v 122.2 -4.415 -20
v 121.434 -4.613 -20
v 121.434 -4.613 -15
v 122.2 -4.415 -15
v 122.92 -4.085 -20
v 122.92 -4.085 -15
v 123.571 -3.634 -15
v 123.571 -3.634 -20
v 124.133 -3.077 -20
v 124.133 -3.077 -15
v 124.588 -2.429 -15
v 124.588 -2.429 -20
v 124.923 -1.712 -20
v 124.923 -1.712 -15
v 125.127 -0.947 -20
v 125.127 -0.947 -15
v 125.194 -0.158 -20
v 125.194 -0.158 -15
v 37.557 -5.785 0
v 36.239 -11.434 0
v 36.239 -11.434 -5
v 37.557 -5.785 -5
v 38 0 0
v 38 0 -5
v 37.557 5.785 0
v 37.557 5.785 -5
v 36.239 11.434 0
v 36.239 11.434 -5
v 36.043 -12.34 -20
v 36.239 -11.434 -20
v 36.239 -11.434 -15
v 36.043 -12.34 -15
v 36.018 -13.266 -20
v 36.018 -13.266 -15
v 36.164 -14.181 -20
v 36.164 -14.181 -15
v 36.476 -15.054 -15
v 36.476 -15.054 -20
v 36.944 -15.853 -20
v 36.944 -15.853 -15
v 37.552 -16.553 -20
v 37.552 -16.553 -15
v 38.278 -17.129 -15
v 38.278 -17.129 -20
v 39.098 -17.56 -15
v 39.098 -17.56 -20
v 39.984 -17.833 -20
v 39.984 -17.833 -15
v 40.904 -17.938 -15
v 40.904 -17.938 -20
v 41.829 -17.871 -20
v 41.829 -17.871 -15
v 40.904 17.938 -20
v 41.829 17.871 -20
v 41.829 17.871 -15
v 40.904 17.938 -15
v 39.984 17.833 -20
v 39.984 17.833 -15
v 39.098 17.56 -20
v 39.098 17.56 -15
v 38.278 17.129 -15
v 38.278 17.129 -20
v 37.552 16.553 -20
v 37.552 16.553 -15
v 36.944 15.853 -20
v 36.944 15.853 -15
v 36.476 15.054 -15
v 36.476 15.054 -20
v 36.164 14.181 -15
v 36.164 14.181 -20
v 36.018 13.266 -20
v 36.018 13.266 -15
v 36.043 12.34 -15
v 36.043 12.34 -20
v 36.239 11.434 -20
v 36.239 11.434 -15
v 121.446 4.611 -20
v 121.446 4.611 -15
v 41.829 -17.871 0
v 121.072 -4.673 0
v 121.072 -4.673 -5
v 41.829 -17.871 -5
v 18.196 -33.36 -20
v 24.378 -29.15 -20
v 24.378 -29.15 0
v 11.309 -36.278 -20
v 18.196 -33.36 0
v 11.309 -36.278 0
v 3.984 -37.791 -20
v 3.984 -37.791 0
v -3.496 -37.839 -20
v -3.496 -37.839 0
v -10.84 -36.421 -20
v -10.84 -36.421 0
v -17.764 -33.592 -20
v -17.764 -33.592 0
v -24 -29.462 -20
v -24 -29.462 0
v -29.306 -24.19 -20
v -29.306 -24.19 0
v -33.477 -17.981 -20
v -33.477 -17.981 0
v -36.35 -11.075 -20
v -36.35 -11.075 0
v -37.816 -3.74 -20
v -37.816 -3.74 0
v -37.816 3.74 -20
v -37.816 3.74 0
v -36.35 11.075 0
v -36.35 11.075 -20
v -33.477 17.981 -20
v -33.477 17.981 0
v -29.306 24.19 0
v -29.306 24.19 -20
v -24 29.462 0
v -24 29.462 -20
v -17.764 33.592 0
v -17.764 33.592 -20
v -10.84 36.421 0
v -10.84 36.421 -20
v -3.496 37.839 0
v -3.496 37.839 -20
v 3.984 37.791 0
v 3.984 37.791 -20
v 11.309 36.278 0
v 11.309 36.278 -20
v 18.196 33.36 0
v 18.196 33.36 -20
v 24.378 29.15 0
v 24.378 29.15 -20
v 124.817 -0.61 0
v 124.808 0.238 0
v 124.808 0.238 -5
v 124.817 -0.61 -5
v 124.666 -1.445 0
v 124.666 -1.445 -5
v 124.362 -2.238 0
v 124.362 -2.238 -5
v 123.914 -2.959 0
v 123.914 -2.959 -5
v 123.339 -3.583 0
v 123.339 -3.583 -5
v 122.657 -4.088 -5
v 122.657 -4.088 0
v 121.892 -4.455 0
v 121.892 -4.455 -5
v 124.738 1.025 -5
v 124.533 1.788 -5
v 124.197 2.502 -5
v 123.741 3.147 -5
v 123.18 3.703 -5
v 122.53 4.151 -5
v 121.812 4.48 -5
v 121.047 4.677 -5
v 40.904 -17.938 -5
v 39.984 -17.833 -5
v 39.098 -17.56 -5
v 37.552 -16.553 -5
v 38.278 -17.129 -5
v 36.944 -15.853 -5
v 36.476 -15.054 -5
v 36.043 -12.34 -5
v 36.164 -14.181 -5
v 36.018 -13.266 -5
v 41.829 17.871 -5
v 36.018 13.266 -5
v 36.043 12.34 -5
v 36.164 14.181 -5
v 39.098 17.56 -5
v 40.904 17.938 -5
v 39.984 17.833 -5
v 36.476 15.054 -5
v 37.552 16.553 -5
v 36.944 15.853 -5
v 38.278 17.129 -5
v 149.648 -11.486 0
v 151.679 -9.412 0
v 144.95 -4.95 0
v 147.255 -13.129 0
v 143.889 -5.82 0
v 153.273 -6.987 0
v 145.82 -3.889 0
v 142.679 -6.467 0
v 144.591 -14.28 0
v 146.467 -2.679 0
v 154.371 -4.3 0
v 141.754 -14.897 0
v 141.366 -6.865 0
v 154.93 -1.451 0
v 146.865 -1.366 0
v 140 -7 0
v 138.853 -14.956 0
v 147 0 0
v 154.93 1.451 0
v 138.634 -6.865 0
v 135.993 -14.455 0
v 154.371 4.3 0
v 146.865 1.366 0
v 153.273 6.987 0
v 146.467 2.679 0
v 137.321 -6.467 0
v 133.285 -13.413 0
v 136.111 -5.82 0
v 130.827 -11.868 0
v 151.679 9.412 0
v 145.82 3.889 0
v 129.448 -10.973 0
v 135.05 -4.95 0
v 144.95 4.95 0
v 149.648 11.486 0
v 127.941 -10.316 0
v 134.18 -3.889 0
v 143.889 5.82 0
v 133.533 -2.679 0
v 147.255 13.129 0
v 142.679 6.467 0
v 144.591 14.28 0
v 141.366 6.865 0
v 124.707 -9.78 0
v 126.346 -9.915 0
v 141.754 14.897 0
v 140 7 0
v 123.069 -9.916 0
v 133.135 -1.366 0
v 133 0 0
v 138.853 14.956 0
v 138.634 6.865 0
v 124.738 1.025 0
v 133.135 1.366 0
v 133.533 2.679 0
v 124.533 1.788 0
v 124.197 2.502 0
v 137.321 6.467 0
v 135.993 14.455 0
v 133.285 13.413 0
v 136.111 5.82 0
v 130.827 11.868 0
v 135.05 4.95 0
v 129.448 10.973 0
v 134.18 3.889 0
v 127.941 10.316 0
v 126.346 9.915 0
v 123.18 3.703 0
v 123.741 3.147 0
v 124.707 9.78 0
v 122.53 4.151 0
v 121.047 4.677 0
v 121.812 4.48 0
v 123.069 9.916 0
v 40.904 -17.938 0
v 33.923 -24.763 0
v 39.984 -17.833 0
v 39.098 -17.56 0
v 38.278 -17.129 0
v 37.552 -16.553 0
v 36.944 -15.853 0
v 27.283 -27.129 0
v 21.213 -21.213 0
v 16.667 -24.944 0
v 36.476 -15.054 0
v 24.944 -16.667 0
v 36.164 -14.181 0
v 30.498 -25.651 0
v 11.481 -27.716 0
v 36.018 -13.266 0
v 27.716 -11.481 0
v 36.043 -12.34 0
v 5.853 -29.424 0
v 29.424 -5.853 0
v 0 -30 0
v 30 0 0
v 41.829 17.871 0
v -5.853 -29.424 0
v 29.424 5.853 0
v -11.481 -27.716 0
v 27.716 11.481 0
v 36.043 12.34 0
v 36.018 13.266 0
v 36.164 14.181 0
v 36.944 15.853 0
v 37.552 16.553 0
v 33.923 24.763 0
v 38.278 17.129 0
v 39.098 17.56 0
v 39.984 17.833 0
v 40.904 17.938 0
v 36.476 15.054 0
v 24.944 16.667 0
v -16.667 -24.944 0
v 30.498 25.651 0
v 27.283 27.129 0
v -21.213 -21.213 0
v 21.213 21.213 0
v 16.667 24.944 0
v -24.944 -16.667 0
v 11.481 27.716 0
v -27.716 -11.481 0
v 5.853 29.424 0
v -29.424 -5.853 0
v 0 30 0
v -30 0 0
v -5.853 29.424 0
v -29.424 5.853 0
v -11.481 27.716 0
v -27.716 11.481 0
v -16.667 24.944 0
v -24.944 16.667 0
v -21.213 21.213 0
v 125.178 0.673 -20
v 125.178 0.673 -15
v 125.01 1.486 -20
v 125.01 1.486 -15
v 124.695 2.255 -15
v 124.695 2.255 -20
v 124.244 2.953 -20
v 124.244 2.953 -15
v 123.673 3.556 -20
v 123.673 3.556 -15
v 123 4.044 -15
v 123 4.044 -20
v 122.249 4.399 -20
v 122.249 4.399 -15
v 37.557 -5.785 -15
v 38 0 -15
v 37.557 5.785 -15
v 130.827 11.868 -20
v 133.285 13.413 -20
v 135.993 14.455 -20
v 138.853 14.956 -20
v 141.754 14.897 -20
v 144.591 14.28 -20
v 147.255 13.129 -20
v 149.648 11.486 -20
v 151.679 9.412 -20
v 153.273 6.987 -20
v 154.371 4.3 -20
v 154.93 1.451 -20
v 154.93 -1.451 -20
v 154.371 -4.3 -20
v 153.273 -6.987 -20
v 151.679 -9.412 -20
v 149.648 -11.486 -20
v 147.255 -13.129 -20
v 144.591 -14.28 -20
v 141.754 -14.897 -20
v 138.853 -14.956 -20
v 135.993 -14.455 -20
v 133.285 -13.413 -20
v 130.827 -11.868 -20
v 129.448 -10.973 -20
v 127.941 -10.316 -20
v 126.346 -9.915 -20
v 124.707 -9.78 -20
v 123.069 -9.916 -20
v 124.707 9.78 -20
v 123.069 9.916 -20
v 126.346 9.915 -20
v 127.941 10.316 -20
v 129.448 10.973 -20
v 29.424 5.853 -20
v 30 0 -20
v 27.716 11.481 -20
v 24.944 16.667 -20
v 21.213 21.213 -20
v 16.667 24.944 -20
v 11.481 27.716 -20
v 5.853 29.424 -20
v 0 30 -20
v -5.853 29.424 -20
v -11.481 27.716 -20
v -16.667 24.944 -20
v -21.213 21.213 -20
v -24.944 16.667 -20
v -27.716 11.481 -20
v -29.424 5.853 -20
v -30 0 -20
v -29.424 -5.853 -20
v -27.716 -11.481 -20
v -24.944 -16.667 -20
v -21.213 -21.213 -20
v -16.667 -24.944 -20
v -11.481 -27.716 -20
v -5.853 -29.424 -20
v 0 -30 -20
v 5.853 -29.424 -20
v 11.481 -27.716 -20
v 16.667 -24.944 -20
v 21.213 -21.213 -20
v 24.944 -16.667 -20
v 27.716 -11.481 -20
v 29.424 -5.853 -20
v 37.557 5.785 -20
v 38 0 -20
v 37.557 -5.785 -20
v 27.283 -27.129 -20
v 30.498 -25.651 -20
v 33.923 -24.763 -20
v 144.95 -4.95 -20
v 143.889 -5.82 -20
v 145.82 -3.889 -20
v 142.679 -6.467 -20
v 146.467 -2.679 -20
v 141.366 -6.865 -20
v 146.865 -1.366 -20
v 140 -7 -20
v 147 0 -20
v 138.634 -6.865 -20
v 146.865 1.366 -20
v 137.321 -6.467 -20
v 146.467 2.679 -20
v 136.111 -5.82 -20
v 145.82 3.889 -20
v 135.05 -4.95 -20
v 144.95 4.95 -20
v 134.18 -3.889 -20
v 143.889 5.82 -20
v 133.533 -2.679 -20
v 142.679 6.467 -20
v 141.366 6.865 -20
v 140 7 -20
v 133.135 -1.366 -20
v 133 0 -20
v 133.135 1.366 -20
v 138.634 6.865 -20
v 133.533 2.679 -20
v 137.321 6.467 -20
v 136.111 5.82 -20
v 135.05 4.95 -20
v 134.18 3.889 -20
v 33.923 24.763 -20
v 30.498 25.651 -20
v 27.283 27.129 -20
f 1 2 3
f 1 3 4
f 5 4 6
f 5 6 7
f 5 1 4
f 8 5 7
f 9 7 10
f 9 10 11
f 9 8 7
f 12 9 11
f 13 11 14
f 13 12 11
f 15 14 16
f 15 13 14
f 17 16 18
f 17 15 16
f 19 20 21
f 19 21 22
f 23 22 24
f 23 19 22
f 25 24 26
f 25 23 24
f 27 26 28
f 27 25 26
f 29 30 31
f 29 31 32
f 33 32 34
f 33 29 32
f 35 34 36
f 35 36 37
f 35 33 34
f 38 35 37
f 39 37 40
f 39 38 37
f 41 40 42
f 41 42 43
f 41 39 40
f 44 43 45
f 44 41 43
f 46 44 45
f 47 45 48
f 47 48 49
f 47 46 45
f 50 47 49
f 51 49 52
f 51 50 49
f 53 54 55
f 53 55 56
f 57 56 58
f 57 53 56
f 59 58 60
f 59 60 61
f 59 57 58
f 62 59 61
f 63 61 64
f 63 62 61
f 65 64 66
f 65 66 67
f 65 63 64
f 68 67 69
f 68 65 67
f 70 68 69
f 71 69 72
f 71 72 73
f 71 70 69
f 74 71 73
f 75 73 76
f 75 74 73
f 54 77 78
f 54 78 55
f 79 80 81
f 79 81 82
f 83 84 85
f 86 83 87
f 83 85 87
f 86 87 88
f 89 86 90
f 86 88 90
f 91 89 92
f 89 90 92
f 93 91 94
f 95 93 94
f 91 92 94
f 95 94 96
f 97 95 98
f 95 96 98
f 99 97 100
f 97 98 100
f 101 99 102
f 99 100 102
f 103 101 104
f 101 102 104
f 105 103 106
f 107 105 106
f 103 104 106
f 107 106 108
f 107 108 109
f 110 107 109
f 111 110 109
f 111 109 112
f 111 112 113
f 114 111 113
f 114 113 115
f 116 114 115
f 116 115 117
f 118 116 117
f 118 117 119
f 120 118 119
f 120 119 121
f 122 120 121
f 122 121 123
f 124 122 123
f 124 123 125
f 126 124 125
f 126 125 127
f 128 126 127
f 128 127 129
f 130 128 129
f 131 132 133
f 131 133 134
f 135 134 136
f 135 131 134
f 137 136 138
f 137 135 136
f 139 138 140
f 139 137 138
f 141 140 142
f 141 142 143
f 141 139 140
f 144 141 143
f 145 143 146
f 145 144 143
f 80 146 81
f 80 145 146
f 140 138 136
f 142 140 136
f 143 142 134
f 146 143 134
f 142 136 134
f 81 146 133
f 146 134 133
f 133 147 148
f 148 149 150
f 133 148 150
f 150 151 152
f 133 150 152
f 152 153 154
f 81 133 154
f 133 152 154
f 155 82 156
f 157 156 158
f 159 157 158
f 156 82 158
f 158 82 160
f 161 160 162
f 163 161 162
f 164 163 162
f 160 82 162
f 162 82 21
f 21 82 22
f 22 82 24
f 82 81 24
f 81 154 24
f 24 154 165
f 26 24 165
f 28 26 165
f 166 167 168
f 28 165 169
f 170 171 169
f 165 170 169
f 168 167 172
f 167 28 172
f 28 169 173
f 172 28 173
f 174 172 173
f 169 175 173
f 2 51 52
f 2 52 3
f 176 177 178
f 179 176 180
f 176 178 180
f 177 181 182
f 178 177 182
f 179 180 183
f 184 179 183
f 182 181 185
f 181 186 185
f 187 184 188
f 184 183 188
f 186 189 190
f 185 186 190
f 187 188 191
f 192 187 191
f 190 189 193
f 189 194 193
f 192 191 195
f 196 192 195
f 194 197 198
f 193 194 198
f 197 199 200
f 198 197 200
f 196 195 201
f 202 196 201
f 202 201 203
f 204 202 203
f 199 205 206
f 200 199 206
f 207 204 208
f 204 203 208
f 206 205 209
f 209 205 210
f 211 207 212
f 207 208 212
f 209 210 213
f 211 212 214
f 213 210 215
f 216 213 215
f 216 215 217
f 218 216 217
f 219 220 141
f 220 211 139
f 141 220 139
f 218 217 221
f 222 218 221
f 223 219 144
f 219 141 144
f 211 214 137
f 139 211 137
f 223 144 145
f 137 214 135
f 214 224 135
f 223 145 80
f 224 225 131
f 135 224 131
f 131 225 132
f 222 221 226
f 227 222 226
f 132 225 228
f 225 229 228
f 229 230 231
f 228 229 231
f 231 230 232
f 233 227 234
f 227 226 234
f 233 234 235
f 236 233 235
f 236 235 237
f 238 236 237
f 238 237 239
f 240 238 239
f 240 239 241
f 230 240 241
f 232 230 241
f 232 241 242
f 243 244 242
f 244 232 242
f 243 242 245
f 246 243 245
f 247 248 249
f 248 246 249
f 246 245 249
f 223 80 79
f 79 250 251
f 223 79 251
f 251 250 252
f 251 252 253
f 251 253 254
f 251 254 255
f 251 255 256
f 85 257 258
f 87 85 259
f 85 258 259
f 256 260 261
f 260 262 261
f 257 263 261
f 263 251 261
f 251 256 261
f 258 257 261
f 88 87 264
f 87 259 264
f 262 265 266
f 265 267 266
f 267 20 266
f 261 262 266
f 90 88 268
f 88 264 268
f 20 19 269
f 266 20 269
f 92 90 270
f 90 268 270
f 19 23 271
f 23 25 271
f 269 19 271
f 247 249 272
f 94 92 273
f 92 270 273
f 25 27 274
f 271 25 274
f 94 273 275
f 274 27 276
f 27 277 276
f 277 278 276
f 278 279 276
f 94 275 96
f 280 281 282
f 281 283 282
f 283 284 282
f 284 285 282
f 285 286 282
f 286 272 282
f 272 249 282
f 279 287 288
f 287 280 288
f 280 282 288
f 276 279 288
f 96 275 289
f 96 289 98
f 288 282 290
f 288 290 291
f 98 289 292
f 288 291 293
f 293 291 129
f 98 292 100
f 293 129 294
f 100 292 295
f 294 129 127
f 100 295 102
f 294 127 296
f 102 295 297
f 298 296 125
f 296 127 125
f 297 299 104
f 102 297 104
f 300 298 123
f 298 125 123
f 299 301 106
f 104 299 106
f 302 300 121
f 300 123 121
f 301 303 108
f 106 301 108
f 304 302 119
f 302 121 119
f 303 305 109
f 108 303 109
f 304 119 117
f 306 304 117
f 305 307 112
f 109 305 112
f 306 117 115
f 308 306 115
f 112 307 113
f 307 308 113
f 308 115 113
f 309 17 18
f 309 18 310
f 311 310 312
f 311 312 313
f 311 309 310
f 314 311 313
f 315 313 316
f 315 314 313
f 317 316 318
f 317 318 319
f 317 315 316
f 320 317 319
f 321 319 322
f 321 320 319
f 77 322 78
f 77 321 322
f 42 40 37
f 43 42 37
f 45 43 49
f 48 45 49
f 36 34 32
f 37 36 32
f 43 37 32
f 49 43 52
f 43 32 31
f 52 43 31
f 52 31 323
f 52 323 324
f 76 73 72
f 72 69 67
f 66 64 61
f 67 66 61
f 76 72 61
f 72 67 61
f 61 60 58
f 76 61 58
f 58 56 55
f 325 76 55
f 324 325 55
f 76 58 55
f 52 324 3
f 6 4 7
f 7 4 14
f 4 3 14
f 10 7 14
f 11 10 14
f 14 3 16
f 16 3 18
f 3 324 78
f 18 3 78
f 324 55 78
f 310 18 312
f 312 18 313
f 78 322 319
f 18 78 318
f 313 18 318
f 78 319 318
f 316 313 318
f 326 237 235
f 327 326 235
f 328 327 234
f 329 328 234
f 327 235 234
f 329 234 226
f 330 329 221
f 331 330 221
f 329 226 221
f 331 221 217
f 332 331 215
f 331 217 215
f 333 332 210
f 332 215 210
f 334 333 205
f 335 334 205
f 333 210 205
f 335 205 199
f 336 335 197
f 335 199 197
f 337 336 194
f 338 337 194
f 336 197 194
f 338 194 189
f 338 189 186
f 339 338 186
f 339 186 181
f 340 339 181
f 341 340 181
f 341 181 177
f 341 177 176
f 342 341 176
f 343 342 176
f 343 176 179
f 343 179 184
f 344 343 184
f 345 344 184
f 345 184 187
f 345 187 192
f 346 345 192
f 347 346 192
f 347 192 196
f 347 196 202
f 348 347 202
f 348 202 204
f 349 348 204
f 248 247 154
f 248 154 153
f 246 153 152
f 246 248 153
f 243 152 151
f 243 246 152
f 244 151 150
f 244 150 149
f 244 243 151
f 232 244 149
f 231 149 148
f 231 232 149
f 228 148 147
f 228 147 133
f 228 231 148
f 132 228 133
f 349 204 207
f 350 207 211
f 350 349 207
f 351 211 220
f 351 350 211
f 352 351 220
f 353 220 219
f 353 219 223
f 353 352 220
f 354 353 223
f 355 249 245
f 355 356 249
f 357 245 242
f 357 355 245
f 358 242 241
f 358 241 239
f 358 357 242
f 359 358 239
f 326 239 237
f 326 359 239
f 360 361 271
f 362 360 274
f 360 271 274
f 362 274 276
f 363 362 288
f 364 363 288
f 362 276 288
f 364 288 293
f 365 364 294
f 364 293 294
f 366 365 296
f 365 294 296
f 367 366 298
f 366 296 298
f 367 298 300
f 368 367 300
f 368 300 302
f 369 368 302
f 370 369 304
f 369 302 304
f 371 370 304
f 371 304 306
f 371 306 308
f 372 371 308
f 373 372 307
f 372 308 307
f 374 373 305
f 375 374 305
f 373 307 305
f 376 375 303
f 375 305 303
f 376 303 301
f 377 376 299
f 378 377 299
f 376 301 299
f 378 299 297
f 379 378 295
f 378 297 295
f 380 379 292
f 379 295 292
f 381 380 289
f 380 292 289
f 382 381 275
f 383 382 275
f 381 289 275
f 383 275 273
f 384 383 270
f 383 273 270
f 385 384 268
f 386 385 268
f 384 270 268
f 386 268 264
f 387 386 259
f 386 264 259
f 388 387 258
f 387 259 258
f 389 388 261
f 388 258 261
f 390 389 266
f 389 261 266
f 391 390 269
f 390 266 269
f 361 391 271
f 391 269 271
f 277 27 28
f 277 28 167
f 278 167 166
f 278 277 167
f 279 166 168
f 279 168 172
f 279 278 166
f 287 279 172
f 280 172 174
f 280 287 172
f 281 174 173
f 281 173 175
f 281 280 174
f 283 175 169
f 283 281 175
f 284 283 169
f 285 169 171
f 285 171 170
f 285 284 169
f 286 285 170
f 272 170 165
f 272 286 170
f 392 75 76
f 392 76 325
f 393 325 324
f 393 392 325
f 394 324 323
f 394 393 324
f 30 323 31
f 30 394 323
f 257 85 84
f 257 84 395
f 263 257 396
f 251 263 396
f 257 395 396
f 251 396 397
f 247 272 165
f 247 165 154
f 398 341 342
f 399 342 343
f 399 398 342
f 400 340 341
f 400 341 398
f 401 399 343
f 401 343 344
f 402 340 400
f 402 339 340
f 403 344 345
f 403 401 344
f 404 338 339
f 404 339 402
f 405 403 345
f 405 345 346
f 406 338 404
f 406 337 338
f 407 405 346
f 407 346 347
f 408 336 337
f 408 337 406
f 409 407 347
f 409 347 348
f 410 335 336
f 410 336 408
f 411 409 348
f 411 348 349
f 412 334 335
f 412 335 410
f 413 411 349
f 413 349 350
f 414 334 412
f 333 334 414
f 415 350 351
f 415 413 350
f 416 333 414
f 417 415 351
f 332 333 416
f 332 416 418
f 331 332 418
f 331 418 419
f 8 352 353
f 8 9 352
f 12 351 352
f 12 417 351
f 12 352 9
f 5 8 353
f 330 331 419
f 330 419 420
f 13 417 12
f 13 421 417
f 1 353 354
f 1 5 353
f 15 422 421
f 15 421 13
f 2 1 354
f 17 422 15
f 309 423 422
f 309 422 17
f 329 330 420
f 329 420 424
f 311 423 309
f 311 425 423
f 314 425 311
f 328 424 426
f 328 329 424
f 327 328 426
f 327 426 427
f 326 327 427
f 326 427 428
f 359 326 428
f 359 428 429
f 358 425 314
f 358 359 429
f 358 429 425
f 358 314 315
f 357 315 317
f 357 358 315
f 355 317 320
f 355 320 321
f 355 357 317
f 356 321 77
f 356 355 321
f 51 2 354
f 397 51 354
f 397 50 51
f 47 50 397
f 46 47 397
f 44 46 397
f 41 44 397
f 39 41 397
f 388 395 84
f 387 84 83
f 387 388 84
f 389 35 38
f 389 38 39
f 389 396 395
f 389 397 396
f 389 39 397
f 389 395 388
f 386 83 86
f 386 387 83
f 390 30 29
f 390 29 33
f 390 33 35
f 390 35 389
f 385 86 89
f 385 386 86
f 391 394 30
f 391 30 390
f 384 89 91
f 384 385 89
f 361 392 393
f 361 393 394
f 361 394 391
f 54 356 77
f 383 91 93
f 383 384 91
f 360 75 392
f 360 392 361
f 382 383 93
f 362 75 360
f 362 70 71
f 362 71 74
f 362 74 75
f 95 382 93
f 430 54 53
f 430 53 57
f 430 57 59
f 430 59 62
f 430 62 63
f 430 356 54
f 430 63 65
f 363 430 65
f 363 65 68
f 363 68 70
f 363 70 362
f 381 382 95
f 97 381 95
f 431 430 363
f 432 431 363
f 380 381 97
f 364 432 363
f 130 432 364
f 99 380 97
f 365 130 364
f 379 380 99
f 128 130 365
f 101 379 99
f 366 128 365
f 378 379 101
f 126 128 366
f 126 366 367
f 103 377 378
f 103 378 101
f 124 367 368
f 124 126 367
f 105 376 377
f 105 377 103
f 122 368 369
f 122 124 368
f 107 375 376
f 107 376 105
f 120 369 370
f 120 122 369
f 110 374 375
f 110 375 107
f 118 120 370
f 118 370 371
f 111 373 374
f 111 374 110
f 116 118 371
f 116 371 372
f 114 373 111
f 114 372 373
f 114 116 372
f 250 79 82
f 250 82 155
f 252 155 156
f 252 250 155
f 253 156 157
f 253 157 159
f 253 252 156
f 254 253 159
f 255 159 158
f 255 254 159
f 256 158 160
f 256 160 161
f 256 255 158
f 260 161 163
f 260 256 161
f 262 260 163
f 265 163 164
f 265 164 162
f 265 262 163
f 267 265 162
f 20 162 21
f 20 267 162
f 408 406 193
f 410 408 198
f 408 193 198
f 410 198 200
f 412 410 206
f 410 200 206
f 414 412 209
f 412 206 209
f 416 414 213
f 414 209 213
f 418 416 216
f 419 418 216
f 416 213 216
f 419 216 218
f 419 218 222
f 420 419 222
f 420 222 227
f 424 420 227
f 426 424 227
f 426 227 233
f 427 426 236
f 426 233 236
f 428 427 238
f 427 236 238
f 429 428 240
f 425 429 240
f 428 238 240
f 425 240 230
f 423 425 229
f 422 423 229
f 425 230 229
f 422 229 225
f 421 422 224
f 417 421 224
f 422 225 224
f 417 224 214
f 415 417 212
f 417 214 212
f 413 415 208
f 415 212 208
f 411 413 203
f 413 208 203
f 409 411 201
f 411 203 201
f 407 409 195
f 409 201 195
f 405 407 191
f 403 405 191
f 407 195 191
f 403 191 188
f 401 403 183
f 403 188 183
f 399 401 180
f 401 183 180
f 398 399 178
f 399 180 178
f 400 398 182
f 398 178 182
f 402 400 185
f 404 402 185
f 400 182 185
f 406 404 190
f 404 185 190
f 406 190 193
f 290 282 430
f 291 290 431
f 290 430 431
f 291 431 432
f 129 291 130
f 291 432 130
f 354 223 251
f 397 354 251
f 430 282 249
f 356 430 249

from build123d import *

# Parameters (mm, degrees)
SKETCH1_R          = 30
SKETCH1_R_2        = 7
BASE_EXTRUDE_DEPTH = 20
FILLET1_R          = 10
FILLET2_R          = 20
CUT_EXTRUDE1_DEPTH = 5
CUT_EXTRUDE2_DEPTH = 5


with BuildPart() as part:
    # Sketch1 → Base-Extrude (new body)
    with BuildSketch(Plane.XY):
        with BuildLine():
            Line((27.935473676, 25.760615491), (128.063755469, 9.084385863))
            ThreePointArc((128.063755469, 9.084385863), (155, 0), (128.063755469, -9.084385863))
            Line((128.063755469, -9.084385863), (27.935473676, -25.760615491))
            ThreePointArc((27.935473676, -25.760615491), (-38, 0), (27.935473676, 25.760615491))
        make_face()
        Circle(SKETCH1_R, mode=Mode.SUBTRACT)
        with Locations((140, 0)):
            Circle(SKETCH1_R_2, mode=Mode.SUBTRACT)
    extrude(amount=-BASE_EXTRUDE_DEPTH)

    # Fillet1
    fillet1_edges = [part.edges().sort_by_distance(p)[0] for p in [
        (128.063755469, 9.084385863, -10),
        (128.063755469, -9.084385863, -10),
    ]]
    fillet(fillet1_edges, radius=FILLET1_R)

    # Fillet2
    fillet2_edges = [part.edges().sort_by_distance(p)[0] for p in [
        (27.935473676, 25.760615491, -10),
        (27.935473676, -25.760615491, -10),
    ]]
    fillet(fillet2_edges, radius=FILLET2_R)

    # Sketch2 → Cut-Extrude1 (cut)
    with BuildSketch(Plane.XY):
        with BuildLine():
            Line((41.828554558, 17.870982725), (121.046940728, 4.677267873))
            ThreePointArc((121.046940728, 4.677267873), (123.741079282, 3.147292859), (124.807655013, 0.238406077))
            ThreePointArc((124.807655013, 0.238406077), (123.914202634, -2.958553332), (121.071833732, -4.673121977))
            Line((121.071833732, -4.673121977), (41.828554558, -17.870982725))
            ThreePointArc((41.828554558, -17.870982725), (37.231968897, -16.217361812), (36.238855523, -11.43439331))
            ThreePointArc((36.238855523, -11.43439331), (38, 0), (36.238855523, 11.43439331))
            ThreePointArc((36.238855523, 11.43439331), (37.231968897, 16.217361812), (41.828554558, 17.870982725))
        make_face()
    extrude(amount=-CUT_EXTRUDE1_DEPTH, mode=Mode.SUBTRACT)

    # Sketch3 → Cut-Extrude2 (cut)
    with BuildSketch(Plane(origin=(0, 0, -20), x_dir=(-1, 0, 0), z_dir=(0, 0, -1))):
        with BuildLine():
            Line((-121.445609231, 4.610870174), (-41.828554558, 17.870982725))
            ThreePointArc((-41.828554558, 17.870982725), (-37.231968897, 16.217361812), (-36.238855523, 11.43439331))
            ThreePointArc((-36.238855523, 11.43439331), (-38, 0), (-36.238855523, -11.43439331))
            ThreePointArc((-36.238855523, -11.43439331), (-37.231968897, -16.217361812), (-41.828554558, -17.870982725))
            Line((-41.828554558, -17.870982725), (-121.433526351, -4.612882562))
            ThreePointArc((-121.433526351, -4.612882562), (-124.132861899, -3.076762276), (-125.194211834, -0.157924451))
            ThreePointArc((-125.194211834, -0.157924451), (-124.244145959, 2.952985869), (-121.445609231, 4.610870174))
        make_face()
    extrude(amount=-CUT_EXTRUDE2_DEPTH, mode=Mode.SUBTRACT)


solid = part.part
